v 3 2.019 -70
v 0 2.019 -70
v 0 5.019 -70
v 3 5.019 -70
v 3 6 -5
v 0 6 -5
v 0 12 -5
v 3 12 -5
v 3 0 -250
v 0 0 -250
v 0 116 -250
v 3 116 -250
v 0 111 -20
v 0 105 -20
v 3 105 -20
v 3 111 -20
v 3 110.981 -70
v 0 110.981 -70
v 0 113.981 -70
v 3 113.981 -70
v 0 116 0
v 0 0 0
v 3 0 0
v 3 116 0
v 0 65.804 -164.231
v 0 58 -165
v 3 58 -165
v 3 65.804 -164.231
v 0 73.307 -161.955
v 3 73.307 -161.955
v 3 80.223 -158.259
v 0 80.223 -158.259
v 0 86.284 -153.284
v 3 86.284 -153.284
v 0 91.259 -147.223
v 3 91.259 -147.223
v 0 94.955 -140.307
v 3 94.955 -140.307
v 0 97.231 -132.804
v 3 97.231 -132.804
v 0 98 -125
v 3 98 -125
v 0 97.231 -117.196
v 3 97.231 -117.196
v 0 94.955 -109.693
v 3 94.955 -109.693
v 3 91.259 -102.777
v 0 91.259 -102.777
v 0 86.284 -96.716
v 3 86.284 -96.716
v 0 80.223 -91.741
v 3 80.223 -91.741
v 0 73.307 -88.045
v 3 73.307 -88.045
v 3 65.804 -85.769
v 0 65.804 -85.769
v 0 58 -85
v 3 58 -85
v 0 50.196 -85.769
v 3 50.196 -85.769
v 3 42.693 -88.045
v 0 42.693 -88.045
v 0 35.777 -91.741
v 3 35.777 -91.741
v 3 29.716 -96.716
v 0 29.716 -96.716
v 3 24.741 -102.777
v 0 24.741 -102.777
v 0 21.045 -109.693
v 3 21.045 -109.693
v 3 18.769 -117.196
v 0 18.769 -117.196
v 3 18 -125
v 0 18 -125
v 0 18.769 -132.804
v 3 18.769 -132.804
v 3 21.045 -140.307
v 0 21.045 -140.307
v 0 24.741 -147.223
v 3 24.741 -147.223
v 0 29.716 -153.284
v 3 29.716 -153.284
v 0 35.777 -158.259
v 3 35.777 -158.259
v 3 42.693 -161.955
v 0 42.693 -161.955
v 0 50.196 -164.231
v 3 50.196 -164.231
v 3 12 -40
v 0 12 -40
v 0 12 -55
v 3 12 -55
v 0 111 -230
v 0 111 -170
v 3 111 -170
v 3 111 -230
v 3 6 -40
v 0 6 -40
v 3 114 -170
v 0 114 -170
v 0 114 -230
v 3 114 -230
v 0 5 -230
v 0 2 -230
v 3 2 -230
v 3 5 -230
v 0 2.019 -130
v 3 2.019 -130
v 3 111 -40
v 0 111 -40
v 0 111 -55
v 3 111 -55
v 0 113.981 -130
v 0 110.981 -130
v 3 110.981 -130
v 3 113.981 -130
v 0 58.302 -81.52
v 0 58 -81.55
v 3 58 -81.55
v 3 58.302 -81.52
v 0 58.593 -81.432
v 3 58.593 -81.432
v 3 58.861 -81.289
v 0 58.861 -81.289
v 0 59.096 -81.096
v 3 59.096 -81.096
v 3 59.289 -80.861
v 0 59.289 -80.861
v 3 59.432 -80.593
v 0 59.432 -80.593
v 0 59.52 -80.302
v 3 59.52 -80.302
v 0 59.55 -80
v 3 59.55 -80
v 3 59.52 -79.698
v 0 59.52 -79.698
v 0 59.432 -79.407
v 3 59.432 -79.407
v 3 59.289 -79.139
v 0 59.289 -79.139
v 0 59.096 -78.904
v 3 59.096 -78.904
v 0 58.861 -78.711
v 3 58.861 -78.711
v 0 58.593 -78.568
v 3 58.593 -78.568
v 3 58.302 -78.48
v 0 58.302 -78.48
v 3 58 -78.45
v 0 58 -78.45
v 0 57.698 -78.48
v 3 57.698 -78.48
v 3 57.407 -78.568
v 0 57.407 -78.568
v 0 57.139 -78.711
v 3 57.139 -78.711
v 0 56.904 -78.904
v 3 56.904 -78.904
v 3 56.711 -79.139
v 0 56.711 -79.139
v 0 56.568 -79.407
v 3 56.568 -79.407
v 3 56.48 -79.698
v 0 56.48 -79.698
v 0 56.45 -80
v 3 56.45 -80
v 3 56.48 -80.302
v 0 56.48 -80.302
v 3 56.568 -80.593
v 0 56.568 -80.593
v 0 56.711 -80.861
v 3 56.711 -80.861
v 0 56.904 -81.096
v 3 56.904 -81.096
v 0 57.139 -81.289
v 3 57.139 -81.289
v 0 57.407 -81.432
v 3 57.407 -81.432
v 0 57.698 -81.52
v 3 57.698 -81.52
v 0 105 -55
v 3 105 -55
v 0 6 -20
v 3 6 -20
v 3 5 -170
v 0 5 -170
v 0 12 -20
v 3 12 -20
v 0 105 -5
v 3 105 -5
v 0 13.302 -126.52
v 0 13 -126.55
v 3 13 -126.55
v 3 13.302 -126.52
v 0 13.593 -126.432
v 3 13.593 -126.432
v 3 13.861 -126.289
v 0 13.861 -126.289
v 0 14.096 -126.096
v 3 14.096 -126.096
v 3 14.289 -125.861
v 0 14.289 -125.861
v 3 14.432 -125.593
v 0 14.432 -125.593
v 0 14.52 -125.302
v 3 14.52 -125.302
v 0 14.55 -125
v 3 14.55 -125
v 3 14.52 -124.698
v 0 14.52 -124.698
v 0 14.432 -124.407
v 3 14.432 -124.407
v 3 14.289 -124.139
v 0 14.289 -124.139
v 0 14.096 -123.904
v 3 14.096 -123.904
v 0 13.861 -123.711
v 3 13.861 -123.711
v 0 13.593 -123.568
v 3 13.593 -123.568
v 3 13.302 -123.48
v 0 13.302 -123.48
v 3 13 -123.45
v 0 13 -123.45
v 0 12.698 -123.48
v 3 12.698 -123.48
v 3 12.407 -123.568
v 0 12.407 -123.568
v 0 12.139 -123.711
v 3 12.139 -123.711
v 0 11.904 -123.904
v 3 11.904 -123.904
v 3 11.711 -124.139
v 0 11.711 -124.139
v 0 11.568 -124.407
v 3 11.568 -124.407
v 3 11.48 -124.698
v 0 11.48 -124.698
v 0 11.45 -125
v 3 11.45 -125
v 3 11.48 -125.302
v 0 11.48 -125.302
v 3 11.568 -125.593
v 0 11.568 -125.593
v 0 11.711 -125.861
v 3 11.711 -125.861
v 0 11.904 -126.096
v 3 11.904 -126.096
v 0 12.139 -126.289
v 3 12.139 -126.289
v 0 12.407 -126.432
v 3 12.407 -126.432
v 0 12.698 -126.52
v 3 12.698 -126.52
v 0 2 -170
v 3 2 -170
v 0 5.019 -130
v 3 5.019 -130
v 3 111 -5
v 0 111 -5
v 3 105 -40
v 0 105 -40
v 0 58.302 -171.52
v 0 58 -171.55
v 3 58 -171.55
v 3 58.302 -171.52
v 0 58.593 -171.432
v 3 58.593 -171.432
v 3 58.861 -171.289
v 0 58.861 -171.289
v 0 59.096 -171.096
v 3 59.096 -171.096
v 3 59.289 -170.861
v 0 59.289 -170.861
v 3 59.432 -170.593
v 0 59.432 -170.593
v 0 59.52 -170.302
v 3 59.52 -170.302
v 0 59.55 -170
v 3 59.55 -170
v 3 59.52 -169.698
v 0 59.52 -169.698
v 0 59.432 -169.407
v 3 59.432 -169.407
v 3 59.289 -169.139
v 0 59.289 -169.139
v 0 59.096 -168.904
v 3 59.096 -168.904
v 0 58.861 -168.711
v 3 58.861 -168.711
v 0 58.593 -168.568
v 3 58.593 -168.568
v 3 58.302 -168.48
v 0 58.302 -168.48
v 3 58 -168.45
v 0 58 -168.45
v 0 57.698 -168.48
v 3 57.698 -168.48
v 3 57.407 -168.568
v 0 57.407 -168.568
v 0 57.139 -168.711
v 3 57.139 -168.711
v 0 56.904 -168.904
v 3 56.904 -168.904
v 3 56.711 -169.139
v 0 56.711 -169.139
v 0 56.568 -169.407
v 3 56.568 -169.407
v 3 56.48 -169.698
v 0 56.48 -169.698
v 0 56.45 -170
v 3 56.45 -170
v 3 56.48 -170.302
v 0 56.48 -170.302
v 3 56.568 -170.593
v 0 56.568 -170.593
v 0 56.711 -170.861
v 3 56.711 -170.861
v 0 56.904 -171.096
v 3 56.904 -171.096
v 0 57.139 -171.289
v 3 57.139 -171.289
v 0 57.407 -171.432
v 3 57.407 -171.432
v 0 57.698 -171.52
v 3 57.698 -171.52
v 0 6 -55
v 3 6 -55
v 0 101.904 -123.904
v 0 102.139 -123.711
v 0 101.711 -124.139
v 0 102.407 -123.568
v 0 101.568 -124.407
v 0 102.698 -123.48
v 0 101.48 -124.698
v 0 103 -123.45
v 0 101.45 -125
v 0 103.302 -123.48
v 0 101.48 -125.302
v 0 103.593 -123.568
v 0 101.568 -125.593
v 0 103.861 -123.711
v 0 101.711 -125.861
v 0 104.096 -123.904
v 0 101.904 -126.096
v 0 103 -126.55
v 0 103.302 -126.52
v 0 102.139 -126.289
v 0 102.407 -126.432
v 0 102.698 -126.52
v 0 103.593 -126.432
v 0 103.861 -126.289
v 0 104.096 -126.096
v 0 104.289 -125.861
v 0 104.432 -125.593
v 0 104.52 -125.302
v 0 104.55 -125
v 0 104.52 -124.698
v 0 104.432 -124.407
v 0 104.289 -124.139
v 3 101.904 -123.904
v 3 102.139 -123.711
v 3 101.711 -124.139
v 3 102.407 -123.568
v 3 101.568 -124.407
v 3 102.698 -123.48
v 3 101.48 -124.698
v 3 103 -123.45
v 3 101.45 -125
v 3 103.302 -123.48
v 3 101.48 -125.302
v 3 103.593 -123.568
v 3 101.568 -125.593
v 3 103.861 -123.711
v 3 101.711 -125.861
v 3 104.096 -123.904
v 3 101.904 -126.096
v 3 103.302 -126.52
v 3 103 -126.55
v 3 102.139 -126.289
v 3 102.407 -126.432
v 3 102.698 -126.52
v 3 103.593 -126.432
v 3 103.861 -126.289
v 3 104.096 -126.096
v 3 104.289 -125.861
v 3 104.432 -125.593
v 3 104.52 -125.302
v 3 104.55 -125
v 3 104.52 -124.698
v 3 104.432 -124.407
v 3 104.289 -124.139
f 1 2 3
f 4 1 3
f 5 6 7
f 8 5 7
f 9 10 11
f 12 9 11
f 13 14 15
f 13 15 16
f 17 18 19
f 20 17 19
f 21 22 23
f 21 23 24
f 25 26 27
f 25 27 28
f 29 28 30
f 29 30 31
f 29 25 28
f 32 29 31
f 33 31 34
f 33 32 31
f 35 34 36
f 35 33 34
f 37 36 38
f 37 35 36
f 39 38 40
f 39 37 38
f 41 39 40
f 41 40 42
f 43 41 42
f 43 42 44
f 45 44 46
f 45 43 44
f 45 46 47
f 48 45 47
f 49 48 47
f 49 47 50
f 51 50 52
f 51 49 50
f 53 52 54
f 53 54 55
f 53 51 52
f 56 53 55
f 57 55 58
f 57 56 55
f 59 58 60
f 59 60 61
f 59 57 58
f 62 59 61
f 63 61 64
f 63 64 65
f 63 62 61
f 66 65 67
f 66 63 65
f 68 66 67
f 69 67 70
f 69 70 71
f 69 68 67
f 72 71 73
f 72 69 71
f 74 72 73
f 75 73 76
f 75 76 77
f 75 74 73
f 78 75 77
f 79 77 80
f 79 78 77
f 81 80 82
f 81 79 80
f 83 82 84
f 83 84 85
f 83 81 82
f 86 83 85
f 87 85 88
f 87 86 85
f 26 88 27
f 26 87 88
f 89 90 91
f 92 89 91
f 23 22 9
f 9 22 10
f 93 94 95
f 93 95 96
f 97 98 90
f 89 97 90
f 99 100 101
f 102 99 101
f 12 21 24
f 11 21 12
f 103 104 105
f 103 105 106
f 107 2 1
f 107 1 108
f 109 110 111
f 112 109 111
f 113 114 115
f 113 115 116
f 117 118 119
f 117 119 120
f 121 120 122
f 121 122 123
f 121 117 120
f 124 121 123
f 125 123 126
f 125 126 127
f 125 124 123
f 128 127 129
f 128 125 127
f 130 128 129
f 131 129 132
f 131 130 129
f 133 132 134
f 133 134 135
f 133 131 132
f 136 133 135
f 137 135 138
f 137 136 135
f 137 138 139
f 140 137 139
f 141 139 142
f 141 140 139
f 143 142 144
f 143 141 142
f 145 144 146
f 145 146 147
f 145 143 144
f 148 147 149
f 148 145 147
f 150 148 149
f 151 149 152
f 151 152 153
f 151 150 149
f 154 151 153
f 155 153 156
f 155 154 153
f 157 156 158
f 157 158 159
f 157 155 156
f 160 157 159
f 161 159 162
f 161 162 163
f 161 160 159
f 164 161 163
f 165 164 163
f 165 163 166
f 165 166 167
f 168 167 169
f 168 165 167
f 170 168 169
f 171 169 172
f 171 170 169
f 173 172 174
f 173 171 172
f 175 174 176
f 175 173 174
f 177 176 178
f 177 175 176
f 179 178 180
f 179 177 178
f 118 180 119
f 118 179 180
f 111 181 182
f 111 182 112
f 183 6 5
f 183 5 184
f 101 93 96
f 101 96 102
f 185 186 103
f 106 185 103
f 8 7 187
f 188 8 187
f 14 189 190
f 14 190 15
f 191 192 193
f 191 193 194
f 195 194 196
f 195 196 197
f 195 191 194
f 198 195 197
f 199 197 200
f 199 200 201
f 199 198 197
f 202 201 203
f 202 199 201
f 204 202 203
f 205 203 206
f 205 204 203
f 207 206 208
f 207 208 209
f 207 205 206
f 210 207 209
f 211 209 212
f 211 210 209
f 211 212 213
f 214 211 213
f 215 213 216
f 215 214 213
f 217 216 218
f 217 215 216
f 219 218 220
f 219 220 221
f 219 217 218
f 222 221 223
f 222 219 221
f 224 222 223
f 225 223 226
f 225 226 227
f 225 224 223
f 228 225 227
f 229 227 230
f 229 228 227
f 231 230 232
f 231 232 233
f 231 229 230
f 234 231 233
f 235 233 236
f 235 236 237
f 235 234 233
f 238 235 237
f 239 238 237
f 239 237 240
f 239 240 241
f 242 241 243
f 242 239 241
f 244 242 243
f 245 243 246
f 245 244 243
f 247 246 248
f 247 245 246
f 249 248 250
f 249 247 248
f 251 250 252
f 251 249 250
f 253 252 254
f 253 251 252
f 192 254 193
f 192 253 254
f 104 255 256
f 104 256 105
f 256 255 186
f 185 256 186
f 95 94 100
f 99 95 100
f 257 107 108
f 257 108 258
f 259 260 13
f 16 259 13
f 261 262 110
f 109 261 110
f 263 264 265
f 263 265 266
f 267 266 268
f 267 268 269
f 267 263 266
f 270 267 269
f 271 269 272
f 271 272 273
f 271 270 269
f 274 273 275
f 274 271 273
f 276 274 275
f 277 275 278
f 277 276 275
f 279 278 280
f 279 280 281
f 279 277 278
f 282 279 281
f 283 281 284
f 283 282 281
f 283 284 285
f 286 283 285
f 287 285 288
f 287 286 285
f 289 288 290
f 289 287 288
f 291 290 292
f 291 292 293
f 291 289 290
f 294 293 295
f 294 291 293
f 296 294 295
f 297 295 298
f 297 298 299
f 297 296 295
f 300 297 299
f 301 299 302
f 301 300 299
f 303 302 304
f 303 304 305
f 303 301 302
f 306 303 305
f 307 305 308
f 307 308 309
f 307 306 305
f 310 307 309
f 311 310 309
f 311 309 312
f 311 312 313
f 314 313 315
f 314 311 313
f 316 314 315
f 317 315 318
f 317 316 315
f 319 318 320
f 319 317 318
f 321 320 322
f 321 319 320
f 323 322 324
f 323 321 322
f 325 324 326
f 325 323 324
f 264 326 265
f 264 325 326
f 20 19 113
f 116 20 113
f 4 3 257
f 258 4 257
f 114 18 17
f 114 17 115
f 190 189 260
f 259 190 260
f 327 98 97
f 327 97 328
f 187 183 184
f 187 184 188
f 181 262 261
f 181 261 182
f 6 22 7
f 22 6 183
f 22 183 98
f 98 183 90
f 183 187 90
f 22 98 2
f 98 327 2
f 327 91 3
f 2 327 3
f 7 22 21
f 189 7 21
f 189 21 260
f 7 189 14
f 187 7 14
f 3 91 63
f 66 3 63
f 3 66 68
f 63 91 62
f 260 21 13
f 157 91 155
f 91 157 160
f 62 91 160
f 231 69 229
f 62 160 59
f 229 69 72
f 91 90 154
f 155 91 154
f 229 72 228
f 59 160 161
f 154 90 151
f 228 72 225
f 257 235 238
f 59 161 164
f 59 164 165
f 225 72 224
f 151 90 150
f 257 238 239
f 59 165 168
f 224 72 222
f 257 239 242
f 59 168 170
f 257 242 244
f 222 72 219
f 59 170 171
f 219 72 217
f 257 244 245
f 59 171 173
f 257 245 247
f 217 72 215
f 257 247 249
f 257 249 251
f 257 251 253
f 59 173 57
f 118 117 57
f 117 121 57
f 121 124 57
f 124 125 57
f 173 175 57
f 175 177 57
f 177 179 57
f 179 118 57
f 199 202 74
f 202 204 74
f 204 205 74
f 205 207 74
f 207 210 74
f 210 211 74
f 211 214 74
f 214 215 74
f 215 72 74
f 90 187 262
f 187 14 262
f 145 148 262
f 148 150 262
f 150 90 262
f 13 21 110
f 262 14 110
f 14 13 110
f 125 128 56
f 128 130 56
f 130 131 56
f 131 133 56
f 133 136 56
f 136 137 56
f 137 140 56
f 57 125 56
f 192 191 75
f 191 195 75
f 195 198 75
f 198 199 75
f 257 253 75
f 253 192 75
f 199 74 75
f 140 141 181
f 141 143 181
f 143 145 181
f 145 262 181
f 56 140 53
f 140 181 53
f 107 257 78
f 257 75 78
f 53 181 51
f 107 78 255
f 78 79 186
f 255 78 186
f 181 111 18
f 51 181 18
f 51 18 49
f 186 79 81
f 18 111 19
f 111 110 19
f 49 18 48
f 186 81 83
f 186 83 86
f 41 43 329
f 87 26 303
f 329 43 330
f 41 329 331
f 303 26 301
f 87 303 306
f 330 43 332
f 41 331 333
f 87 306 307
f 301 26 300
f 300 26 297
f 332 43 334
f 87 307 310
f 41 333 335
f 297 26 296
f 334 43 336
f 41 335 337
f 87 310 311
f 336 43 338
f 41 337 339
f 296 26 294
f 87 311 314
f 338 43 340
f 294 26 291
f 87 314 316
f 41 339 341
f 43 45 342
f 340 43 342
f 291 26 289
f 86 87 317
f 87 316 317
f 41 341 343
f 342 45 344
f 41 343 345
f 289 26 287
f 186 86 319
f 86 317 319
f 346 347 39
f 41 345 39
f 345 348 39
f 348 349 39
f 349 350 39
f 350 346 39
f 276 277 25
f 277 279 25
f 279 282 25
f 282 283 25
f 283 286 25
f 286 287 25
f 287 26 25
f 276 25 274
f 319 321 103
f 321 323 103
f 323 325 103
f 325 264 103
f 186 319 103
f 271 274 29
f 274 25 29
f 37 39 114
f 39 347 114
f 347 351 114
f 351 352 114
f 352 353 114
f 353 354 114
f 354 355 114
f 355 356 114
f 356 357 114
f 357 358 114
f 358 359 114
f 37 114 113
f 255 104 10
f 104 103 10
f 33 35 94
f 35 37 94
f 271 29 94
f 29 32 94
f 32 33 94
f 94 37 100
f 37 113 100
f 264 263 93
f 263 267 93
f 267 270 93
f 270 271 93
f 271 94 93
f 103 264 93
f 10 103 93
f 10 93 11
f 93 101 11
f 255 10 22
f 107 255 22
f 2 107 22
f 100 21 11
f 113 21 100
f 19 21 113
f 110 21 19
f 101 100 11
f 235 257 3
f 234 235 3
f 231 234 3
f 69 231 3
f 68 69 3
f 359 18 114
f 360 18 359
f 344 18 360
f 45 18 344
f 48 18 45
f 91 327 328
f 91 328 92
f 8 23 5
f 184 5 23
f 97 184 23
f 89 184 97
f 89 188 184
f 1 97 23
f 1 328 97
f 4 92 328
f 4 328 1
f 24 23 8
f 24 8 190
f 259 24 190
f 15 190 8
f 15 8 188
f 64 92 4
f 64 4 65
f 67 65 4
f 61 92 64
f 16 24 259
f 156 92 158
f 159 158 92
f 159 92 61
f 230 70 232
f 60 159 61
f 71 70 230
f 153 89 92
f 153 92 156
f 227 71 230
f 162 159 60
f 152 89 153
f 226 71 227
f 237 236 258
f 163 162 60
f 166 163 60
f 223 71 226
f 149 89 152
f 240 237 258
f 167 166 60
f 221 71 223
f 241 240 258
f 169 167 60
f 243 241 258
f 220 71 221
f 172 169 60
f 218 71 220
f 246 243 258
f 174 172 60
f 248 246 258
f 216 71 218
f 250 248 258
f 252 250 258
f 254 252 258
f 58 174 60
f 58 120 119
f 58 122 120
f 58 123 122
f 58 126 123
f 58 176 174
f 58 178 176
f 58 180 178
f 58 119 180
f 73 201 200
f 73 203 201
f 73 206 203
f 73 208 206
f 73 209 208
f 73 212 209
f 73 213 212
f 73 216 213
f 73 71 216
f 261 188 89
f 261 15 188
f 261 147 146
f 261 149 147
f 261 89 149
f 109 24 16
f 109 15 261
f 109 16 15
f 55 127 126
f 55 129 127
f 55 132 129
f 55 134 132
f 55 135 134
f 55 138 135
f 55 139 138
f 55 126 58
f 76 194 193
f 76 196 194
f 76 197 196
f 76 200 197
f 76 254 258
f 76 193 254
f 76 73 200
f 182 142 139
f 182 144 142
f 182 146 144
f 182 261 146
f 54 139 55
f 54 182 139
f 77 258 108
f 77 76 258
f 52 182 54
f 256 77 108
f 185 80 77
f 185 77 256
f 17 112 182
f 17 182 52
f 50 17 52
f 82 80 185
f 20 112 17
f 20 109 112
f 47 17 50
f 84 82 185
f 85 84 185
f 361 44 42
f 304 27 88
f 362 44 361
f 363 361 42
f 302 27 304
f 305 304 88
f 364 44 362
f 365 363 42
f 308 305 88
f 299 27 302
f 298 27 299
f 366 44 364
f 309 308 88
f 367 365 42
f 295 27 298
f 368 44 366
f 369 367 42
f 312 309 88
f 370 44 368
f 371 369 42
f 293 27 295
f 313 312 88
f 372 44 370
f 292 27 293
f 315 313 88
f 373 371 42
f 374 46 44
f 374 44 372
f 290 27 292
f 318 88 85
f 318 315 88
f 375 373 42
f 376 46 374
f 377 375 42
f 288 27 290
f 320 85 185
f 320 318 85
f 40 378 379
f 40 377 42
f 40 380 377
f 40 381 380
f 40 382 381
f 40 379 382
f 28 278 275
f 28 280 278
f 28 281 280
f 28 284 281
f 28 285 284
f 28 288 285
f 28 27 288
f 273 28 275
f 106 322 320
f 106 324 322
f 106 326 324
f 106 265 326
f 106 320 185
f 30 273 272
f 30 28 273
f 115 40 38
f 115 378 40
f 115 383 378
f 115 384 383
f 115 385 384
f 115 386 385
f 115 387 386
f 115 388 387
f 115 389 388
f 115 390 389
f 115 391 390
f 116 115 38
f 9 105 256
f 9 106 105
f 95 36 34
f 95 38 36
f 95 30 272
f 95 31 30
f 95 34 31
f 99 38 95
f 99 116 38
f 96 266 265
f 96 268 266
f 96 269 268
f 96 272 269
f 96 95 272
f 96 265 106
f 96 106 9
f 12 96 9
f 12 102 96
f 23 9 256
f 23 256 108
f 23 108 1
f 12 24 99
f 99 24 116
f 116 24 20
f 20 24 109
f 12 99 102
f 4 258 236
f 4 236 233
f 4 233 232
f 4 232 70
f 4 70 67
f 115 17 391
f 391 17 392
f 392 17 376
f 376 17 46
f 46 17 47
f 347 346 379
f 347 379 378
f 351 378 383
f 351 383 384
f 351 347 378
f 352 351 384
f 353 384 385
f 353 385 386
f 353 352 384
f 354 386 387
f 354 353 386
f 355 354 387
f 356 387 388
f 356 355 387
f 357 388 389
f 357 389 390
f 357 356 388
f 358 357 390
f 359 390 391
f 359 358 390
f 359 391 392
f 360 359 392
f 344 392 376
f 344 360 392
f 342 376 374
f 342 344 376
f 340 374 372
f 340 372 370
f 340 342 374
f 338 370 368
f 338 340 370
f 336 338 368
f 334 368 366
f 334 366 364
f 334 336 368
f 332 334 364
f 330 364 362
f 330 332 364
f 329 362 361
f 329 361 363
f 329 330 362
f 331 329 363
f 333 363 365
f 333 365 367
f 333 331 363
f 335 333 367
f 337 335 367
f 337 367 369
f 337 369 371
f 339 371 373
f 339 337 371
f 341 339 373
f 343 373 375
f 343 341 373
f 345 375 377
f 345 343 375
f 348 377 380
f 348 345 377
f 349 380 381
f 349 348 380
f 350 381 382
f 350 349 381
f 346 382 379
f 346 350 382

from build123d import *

# Parameters (mm, degrees)
ESQUISSE1_W        = 250
ESQUISSE1_H        = 116
ESQUISSE1_R        = 40
ESQUISSE1_R_2      = 1.55
ESQUISSE1_W_2      = 15
ESQUISSE1_H_2      = 6
ESQUISSE1_W_3      = 60
ESQUISSE1_H_3      = 3
BOSS_EXTRU_1_DEPTH = 3


with BuildPart() as part:
    # Esquisse1 → Boss.-Extru.1 (new body)
    with BuildSketch(Plane(origin=(0, 0, 0), x_dir=(0, 0, -1), z_dir=(1, 0, 0))):
        with Locations((125, 58)):
            Rectangle(ESQUISSE1_W, ESQUISSE1_H)
        with Locations((125, 58)):
            Circle(ESQUISSE1_R, mode=Mode.SUBTRACT)
        with Locations((125, 103)):
            Circle(ESQUISSE1_R_2, mode=Mode.SUBTRACT)
        with Locations((125, 13)):
            Circle(ESQUISSE1_R_2, mode=Mode.SUBTRACT)
        with Locations((80, 58)):
            Circle(ESQUISSE1_R_2, mode=Mode.SUBTRACT)
        with Locations((170, 58)):
            Circle(ESQUISSE1_R_2, mode=Mode.SUBTRACT)
        with Locations((12.5, 108)):
            Rectangle(ESQUISSE1_W_2, ESQUISSE1_H_2, mode=Mode.SUBTRACT)
        with Locations((12.5, 9)):
            Rectangle(ESQUISSE1_W_2, ESQUISSE1_H_2, mode=Mode.SUBTRACT)
        with Locations((47.5, 108)):
            Rectangle(ESQUISSE1_W_2, ESQUISSE1_H_2, mode=Mode.SUBTRACT)
        with Locations((47.5, 9)):
            Rectangle(ESQUISSE1_W_2, ESQUISSE1_H_2, mode=Mode.SUBTRACT)
        with Locations((100, 112.481116732)):
            Rectangle(ESQUISSE1_W_3, ESQUISSE1_H_3, mode=Mode.SUBTRACT)
        with Locations((200, 112.5)):
            Rectangle(ESQUISSE1_W_3, ESQUISSE1_H_3, mode=Mode.SUBTRACT)
        with Locations((100, 3.518883268)):
            Rectangle(ESQUISSE1_W_3, ESQUISSE1_H_3, mode=Mode.SUBTRACT)
        with Locations((200, 3.5)):
            Rectangle(ESQUISSE1_W_3, ESQUISSE1_H_3, mode=Mode.SUBTRACT)
    extrude(amount=BOSS_EXTRU_1_DEPTH)


solid = part.part
